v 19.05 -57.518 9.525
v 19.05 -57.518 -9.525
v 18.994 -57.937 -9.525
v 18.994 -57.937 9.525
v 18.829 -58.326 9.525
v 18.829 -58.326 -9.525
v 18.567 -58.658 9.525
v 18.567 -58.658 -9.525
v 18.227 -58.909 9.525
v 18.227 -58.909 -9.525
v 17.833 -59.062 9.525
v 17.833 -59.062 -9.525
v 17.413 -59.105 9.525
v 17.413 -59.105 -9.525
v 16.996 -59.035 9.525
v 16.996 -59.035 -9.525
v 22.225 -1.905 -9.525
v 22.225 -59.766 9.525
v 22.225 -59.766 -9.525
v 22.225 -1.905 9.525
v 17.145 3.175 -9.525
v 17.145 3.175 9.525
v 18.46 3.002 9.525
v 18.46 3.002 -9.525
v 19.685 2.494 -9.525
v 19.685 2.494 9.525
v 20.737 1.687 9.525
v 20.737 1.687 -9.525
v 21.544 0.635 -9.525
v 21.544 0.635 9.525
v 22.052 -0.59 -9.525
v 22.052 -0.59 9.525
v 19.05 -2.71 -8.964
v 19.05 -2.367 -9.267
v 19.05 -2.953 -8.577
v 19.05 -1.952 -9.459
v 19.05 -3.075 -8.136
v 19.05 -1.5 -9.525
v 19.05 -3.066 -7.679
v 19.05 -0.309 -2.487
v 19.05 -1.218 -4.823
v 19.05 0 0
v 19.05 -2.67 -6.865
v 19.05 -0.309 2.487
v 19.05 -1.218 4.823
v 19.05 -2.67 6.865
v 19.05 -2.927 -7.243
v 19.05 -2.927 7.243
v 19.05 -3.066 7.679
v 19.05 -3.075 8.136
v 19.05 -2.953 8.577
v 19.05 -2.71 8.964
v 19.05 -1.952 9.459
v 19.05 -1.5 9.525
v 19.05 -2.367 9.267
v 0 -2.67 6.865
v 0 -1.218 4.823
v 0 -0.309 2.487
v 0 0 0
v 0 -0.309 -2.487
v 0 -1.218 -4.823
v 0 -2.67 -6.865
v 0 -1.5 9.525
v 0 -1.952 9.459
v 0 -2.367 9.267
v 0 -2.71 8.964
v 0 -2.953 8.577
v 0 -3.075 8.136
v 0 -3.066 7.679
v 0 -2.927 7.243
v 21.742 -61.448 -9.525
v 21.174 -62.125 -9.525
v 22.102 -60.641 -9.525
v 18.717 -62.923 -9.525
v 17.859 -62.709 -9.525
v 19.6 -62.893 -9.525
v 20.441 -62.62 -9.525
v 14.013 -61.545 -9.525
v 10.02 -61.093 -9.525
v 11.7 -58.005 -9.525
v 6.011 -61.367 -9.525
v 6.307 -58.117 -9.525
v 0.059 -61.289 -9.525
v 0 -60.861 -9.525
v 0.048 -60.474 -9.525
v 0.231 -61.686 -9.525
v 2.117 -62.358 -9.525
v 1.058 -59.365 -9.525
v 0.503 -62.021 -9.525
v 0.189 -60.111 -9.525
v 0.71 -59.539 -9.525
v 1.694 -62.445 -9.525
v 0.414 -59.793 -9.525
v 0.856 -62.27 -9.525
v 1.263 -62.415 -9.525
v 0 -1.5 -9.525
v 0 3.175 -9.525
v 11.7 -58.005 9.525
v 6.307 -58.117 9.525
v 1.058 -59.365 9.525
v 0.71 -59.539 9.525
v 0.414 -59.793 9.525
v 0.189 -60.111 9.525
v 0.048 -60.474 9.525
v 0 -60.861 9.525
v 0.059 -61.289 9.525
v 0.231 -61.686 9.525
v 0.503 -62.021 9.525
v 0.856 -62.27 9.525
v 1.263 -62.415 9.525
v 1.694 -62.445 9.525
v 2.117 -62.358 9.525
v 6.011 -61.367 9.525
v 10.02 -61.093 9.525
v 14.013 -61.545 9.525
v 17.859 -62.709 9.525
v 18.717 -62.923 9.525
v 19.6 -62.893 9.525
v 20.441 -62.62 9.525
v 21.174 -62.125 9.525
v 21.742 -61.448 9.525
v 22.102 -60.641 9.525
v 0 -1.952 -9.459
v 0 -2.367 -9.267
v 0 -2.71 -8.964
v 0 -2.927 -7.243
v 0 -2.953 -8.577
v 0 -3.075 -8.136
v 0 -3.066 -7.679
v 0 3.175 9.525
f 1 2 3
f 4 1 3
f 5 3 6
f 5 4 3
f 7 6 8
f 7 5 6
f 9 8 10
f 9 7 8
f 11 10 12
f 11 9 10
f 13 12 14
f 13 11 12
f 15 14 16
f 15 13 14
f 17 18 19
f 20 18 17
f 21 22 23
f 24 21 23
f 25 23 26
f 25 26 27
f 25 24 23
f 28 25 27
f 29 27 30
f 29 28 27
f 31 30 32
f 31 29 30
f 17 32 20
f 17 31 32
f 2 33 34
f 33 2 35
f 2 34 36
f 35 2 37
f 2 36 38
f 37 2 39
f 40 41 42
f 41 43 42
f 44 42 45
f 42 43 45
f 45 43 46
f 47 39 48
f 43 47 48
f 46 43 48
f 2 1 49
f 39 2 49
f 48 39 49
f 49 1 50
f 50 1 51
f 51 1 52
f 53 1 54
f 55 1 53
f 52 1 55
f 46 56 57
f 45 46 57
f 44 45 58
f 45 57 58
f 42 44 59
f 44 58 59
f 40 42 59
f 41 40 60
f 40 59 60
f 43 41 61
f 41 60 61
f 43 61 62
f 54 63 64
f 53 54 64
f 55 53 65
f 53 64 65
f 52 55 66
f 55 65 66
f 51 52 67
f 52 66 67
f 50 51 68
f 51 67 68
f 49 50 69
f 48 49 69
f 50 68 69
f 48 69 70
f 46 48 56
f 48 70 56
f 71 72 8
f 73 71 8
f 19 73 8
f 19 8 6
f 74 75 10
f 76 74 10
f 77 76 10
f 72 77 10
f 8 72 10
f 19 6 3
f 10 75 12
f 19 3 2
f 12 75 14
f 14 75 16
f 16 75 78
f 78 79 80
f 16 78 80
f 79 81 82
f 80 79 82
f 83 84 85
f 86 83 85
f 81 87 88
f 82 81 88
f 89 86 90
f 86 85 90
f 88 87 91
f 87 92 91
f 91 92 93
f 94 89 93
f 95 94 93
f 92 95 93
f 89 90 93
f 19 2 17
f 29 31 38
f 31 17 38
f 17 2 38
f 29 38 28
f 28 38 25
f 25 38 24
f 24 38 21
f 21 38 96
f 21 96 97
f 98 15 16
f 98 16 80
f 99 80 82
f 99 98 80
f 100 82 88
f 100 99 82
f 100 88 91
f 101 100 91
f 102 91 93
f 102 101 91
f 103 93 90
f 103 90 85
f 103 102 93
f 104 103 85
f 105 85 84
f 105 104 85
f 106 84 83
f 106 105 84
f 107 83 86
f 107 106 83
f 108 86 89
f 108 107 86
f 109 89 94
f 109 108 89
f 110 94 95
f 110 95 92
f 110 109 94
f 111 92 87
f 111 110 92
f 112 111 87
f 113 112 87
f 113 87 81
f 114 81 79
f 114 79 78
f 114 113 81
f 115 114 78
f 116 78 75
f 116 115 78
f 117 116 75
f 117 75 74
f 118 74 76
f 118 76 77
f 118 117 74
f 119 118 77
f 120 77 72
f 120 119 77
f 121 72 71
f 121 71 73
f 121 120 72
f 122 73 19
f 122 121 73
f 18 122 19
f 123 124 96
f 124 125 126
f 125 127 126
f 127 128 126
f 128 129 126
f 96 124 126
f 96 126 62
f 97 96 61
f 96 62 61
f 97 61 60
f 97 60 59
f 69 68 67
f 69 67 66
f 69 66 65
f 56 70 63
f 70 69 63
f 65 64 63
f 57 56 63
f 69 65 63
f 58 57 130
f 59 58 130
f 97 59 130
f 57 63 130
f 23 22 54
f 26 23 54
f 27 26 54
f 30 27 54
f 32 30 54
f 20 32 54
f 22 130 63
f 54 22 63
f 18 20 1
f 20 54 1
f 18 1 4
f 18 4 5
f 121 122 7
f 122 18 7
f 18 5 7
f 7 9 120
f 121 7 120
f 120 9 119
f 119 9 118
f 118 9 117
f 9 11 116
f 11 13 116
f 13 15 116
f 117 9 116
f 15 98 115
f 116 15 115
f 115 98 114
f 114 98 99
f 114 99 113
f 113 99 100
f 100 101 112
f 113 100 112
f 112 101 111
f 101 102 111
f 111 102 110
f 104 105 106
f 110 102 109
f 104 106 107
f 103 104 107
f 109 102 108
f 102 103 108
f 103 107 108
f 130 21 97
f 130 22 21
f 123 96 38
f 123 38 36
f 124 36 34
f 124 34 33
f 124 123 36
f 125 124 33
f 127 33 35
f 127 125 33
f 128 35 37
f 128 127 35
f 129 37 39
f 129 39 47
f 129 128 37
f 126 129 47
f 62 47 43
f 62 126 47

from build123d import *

# Parameters (mm, degrees)
F2_DEPTH    = 9.525
F3_DEPTH    = 19.05
F4_T1_DEPTH = 31.861787518
F5_R        = 5.08


# Not quite as in the source:
# - a fillet or chamfer that OpenCascade refuses, or shapes differently, is made with other operations: its cross-section is extruded or revolved along the edge and cut away or added


with BuildPart() as f2:
    # F0 (on Top) → F2 (new body, symmetric)
    with BuildSketch(Plane.XY):
        with BuildLine():
            Line((0, 3.175), (0, 0))
            Line((0, 0), (19.05, 0))
            Line((19.05, 0), (19.05, -57.5181780653))
            ThreePointArc((19.05, -57.5181780653), (18.4056155347, -58.7951625359), (16.9955882353, -59.0354617085))
            ThreePointArc((16.9955882353, -59.0354617085), (9.0004674941, -57.9174166081), (1.0583333333, -59.3646503438))
            ThreePointArc((1.0583333333, -59.3646503438), (0.2913116778, -59.944816145), (0, -60.8613596973))
            ThreePointArc((0, -60.8613596973), (0.6709564477, -62.1575480195), (2.1166666667, -62.3580690508))
            ThreePointArc((2.1166666667, -62.3580690508), (10.0201305345, -61.0925159656), (17.859375, -62.708873578))
            ThreePointArc((17.859375, -62.708873578), (20.8248789571, -62.3981407308), (22.225, -59.7655698035))
            Line((22.225, -59.7655698035), (22.225, 3.175))
            Line((22.225, 3.175), (0, 3.175))
        make_face()
    extrude(amount=F2_DEPTH, both=True)

    # F1 (on Right) → F3 (join, through all)
    with BuildSketch(Plane.YZ):
        with BuildLine():
            Line((-6.6244696296, -9.525), (0, -9.525))
            Line((0, -9.525), (0, 0))
            ThreePointArc((0, 0), (-1.8189392592, -5.8010607408), (-6.6244696296, -9.525))
        make_face()
        with BuildLine():
            ThreePointArc((-6.6244696296, 9.525), (-1.8189392592, 5.8010607408), (0, 0))
            Line((0, 0), (0, 9.525))
            Line((0, 9.525), (-6.6244696296, 9.525))
        make_face()
    extrude(amount=F3_DEPTH)

    # F4: fillet of radius 1.5875 on 2 edges, made by hand

    # F4_s2 → F4_t1 (cut)
    with BuildSketch(Plane.YZ.offset(-12.811787518)):
        with BuildLine():
            ThreePointArc((-1.4997546224, 9.525), (-2.9528486536, 8.5767761426), (-2.6700580518, 6.8648648649))
            ThreePointArc((-2.6700580518, 6.8648648649), (-4.4890794666, 8.4300806819), (-6.6244696296, 9.525))
            Line((-6.6244696296, 9.525), (-1.4997546224, 9.525))
        make_face()
        with BuildLine():
            ThreePointArc((-1.4997546224, -9.525), (-2.9528486536, -8.5767761426), (-2.6700580518, -6.8648648649))
            ThreePointArc((-2.6700580518, -6.8648648649), (-4.4890794666, -8.4300806819), (-6.6244696296, -9.525))
            Line((-6.6244696296, -9.525), (-1.4997546224, -9.525))
        make_face()
    extrude(amount=F4_T1_DEPTH, mode=Mode.SUBTRACT)

    # F5
    f5_edges = [f2.edges().sort_by_distance(p)[0] for p in [
        (22.225, 3.175, -4.7625),
        (22.225, 3.175, 4.7625),
    ]]
    fillet(f5_edges, radius=F5_R)


solid = f2.part
